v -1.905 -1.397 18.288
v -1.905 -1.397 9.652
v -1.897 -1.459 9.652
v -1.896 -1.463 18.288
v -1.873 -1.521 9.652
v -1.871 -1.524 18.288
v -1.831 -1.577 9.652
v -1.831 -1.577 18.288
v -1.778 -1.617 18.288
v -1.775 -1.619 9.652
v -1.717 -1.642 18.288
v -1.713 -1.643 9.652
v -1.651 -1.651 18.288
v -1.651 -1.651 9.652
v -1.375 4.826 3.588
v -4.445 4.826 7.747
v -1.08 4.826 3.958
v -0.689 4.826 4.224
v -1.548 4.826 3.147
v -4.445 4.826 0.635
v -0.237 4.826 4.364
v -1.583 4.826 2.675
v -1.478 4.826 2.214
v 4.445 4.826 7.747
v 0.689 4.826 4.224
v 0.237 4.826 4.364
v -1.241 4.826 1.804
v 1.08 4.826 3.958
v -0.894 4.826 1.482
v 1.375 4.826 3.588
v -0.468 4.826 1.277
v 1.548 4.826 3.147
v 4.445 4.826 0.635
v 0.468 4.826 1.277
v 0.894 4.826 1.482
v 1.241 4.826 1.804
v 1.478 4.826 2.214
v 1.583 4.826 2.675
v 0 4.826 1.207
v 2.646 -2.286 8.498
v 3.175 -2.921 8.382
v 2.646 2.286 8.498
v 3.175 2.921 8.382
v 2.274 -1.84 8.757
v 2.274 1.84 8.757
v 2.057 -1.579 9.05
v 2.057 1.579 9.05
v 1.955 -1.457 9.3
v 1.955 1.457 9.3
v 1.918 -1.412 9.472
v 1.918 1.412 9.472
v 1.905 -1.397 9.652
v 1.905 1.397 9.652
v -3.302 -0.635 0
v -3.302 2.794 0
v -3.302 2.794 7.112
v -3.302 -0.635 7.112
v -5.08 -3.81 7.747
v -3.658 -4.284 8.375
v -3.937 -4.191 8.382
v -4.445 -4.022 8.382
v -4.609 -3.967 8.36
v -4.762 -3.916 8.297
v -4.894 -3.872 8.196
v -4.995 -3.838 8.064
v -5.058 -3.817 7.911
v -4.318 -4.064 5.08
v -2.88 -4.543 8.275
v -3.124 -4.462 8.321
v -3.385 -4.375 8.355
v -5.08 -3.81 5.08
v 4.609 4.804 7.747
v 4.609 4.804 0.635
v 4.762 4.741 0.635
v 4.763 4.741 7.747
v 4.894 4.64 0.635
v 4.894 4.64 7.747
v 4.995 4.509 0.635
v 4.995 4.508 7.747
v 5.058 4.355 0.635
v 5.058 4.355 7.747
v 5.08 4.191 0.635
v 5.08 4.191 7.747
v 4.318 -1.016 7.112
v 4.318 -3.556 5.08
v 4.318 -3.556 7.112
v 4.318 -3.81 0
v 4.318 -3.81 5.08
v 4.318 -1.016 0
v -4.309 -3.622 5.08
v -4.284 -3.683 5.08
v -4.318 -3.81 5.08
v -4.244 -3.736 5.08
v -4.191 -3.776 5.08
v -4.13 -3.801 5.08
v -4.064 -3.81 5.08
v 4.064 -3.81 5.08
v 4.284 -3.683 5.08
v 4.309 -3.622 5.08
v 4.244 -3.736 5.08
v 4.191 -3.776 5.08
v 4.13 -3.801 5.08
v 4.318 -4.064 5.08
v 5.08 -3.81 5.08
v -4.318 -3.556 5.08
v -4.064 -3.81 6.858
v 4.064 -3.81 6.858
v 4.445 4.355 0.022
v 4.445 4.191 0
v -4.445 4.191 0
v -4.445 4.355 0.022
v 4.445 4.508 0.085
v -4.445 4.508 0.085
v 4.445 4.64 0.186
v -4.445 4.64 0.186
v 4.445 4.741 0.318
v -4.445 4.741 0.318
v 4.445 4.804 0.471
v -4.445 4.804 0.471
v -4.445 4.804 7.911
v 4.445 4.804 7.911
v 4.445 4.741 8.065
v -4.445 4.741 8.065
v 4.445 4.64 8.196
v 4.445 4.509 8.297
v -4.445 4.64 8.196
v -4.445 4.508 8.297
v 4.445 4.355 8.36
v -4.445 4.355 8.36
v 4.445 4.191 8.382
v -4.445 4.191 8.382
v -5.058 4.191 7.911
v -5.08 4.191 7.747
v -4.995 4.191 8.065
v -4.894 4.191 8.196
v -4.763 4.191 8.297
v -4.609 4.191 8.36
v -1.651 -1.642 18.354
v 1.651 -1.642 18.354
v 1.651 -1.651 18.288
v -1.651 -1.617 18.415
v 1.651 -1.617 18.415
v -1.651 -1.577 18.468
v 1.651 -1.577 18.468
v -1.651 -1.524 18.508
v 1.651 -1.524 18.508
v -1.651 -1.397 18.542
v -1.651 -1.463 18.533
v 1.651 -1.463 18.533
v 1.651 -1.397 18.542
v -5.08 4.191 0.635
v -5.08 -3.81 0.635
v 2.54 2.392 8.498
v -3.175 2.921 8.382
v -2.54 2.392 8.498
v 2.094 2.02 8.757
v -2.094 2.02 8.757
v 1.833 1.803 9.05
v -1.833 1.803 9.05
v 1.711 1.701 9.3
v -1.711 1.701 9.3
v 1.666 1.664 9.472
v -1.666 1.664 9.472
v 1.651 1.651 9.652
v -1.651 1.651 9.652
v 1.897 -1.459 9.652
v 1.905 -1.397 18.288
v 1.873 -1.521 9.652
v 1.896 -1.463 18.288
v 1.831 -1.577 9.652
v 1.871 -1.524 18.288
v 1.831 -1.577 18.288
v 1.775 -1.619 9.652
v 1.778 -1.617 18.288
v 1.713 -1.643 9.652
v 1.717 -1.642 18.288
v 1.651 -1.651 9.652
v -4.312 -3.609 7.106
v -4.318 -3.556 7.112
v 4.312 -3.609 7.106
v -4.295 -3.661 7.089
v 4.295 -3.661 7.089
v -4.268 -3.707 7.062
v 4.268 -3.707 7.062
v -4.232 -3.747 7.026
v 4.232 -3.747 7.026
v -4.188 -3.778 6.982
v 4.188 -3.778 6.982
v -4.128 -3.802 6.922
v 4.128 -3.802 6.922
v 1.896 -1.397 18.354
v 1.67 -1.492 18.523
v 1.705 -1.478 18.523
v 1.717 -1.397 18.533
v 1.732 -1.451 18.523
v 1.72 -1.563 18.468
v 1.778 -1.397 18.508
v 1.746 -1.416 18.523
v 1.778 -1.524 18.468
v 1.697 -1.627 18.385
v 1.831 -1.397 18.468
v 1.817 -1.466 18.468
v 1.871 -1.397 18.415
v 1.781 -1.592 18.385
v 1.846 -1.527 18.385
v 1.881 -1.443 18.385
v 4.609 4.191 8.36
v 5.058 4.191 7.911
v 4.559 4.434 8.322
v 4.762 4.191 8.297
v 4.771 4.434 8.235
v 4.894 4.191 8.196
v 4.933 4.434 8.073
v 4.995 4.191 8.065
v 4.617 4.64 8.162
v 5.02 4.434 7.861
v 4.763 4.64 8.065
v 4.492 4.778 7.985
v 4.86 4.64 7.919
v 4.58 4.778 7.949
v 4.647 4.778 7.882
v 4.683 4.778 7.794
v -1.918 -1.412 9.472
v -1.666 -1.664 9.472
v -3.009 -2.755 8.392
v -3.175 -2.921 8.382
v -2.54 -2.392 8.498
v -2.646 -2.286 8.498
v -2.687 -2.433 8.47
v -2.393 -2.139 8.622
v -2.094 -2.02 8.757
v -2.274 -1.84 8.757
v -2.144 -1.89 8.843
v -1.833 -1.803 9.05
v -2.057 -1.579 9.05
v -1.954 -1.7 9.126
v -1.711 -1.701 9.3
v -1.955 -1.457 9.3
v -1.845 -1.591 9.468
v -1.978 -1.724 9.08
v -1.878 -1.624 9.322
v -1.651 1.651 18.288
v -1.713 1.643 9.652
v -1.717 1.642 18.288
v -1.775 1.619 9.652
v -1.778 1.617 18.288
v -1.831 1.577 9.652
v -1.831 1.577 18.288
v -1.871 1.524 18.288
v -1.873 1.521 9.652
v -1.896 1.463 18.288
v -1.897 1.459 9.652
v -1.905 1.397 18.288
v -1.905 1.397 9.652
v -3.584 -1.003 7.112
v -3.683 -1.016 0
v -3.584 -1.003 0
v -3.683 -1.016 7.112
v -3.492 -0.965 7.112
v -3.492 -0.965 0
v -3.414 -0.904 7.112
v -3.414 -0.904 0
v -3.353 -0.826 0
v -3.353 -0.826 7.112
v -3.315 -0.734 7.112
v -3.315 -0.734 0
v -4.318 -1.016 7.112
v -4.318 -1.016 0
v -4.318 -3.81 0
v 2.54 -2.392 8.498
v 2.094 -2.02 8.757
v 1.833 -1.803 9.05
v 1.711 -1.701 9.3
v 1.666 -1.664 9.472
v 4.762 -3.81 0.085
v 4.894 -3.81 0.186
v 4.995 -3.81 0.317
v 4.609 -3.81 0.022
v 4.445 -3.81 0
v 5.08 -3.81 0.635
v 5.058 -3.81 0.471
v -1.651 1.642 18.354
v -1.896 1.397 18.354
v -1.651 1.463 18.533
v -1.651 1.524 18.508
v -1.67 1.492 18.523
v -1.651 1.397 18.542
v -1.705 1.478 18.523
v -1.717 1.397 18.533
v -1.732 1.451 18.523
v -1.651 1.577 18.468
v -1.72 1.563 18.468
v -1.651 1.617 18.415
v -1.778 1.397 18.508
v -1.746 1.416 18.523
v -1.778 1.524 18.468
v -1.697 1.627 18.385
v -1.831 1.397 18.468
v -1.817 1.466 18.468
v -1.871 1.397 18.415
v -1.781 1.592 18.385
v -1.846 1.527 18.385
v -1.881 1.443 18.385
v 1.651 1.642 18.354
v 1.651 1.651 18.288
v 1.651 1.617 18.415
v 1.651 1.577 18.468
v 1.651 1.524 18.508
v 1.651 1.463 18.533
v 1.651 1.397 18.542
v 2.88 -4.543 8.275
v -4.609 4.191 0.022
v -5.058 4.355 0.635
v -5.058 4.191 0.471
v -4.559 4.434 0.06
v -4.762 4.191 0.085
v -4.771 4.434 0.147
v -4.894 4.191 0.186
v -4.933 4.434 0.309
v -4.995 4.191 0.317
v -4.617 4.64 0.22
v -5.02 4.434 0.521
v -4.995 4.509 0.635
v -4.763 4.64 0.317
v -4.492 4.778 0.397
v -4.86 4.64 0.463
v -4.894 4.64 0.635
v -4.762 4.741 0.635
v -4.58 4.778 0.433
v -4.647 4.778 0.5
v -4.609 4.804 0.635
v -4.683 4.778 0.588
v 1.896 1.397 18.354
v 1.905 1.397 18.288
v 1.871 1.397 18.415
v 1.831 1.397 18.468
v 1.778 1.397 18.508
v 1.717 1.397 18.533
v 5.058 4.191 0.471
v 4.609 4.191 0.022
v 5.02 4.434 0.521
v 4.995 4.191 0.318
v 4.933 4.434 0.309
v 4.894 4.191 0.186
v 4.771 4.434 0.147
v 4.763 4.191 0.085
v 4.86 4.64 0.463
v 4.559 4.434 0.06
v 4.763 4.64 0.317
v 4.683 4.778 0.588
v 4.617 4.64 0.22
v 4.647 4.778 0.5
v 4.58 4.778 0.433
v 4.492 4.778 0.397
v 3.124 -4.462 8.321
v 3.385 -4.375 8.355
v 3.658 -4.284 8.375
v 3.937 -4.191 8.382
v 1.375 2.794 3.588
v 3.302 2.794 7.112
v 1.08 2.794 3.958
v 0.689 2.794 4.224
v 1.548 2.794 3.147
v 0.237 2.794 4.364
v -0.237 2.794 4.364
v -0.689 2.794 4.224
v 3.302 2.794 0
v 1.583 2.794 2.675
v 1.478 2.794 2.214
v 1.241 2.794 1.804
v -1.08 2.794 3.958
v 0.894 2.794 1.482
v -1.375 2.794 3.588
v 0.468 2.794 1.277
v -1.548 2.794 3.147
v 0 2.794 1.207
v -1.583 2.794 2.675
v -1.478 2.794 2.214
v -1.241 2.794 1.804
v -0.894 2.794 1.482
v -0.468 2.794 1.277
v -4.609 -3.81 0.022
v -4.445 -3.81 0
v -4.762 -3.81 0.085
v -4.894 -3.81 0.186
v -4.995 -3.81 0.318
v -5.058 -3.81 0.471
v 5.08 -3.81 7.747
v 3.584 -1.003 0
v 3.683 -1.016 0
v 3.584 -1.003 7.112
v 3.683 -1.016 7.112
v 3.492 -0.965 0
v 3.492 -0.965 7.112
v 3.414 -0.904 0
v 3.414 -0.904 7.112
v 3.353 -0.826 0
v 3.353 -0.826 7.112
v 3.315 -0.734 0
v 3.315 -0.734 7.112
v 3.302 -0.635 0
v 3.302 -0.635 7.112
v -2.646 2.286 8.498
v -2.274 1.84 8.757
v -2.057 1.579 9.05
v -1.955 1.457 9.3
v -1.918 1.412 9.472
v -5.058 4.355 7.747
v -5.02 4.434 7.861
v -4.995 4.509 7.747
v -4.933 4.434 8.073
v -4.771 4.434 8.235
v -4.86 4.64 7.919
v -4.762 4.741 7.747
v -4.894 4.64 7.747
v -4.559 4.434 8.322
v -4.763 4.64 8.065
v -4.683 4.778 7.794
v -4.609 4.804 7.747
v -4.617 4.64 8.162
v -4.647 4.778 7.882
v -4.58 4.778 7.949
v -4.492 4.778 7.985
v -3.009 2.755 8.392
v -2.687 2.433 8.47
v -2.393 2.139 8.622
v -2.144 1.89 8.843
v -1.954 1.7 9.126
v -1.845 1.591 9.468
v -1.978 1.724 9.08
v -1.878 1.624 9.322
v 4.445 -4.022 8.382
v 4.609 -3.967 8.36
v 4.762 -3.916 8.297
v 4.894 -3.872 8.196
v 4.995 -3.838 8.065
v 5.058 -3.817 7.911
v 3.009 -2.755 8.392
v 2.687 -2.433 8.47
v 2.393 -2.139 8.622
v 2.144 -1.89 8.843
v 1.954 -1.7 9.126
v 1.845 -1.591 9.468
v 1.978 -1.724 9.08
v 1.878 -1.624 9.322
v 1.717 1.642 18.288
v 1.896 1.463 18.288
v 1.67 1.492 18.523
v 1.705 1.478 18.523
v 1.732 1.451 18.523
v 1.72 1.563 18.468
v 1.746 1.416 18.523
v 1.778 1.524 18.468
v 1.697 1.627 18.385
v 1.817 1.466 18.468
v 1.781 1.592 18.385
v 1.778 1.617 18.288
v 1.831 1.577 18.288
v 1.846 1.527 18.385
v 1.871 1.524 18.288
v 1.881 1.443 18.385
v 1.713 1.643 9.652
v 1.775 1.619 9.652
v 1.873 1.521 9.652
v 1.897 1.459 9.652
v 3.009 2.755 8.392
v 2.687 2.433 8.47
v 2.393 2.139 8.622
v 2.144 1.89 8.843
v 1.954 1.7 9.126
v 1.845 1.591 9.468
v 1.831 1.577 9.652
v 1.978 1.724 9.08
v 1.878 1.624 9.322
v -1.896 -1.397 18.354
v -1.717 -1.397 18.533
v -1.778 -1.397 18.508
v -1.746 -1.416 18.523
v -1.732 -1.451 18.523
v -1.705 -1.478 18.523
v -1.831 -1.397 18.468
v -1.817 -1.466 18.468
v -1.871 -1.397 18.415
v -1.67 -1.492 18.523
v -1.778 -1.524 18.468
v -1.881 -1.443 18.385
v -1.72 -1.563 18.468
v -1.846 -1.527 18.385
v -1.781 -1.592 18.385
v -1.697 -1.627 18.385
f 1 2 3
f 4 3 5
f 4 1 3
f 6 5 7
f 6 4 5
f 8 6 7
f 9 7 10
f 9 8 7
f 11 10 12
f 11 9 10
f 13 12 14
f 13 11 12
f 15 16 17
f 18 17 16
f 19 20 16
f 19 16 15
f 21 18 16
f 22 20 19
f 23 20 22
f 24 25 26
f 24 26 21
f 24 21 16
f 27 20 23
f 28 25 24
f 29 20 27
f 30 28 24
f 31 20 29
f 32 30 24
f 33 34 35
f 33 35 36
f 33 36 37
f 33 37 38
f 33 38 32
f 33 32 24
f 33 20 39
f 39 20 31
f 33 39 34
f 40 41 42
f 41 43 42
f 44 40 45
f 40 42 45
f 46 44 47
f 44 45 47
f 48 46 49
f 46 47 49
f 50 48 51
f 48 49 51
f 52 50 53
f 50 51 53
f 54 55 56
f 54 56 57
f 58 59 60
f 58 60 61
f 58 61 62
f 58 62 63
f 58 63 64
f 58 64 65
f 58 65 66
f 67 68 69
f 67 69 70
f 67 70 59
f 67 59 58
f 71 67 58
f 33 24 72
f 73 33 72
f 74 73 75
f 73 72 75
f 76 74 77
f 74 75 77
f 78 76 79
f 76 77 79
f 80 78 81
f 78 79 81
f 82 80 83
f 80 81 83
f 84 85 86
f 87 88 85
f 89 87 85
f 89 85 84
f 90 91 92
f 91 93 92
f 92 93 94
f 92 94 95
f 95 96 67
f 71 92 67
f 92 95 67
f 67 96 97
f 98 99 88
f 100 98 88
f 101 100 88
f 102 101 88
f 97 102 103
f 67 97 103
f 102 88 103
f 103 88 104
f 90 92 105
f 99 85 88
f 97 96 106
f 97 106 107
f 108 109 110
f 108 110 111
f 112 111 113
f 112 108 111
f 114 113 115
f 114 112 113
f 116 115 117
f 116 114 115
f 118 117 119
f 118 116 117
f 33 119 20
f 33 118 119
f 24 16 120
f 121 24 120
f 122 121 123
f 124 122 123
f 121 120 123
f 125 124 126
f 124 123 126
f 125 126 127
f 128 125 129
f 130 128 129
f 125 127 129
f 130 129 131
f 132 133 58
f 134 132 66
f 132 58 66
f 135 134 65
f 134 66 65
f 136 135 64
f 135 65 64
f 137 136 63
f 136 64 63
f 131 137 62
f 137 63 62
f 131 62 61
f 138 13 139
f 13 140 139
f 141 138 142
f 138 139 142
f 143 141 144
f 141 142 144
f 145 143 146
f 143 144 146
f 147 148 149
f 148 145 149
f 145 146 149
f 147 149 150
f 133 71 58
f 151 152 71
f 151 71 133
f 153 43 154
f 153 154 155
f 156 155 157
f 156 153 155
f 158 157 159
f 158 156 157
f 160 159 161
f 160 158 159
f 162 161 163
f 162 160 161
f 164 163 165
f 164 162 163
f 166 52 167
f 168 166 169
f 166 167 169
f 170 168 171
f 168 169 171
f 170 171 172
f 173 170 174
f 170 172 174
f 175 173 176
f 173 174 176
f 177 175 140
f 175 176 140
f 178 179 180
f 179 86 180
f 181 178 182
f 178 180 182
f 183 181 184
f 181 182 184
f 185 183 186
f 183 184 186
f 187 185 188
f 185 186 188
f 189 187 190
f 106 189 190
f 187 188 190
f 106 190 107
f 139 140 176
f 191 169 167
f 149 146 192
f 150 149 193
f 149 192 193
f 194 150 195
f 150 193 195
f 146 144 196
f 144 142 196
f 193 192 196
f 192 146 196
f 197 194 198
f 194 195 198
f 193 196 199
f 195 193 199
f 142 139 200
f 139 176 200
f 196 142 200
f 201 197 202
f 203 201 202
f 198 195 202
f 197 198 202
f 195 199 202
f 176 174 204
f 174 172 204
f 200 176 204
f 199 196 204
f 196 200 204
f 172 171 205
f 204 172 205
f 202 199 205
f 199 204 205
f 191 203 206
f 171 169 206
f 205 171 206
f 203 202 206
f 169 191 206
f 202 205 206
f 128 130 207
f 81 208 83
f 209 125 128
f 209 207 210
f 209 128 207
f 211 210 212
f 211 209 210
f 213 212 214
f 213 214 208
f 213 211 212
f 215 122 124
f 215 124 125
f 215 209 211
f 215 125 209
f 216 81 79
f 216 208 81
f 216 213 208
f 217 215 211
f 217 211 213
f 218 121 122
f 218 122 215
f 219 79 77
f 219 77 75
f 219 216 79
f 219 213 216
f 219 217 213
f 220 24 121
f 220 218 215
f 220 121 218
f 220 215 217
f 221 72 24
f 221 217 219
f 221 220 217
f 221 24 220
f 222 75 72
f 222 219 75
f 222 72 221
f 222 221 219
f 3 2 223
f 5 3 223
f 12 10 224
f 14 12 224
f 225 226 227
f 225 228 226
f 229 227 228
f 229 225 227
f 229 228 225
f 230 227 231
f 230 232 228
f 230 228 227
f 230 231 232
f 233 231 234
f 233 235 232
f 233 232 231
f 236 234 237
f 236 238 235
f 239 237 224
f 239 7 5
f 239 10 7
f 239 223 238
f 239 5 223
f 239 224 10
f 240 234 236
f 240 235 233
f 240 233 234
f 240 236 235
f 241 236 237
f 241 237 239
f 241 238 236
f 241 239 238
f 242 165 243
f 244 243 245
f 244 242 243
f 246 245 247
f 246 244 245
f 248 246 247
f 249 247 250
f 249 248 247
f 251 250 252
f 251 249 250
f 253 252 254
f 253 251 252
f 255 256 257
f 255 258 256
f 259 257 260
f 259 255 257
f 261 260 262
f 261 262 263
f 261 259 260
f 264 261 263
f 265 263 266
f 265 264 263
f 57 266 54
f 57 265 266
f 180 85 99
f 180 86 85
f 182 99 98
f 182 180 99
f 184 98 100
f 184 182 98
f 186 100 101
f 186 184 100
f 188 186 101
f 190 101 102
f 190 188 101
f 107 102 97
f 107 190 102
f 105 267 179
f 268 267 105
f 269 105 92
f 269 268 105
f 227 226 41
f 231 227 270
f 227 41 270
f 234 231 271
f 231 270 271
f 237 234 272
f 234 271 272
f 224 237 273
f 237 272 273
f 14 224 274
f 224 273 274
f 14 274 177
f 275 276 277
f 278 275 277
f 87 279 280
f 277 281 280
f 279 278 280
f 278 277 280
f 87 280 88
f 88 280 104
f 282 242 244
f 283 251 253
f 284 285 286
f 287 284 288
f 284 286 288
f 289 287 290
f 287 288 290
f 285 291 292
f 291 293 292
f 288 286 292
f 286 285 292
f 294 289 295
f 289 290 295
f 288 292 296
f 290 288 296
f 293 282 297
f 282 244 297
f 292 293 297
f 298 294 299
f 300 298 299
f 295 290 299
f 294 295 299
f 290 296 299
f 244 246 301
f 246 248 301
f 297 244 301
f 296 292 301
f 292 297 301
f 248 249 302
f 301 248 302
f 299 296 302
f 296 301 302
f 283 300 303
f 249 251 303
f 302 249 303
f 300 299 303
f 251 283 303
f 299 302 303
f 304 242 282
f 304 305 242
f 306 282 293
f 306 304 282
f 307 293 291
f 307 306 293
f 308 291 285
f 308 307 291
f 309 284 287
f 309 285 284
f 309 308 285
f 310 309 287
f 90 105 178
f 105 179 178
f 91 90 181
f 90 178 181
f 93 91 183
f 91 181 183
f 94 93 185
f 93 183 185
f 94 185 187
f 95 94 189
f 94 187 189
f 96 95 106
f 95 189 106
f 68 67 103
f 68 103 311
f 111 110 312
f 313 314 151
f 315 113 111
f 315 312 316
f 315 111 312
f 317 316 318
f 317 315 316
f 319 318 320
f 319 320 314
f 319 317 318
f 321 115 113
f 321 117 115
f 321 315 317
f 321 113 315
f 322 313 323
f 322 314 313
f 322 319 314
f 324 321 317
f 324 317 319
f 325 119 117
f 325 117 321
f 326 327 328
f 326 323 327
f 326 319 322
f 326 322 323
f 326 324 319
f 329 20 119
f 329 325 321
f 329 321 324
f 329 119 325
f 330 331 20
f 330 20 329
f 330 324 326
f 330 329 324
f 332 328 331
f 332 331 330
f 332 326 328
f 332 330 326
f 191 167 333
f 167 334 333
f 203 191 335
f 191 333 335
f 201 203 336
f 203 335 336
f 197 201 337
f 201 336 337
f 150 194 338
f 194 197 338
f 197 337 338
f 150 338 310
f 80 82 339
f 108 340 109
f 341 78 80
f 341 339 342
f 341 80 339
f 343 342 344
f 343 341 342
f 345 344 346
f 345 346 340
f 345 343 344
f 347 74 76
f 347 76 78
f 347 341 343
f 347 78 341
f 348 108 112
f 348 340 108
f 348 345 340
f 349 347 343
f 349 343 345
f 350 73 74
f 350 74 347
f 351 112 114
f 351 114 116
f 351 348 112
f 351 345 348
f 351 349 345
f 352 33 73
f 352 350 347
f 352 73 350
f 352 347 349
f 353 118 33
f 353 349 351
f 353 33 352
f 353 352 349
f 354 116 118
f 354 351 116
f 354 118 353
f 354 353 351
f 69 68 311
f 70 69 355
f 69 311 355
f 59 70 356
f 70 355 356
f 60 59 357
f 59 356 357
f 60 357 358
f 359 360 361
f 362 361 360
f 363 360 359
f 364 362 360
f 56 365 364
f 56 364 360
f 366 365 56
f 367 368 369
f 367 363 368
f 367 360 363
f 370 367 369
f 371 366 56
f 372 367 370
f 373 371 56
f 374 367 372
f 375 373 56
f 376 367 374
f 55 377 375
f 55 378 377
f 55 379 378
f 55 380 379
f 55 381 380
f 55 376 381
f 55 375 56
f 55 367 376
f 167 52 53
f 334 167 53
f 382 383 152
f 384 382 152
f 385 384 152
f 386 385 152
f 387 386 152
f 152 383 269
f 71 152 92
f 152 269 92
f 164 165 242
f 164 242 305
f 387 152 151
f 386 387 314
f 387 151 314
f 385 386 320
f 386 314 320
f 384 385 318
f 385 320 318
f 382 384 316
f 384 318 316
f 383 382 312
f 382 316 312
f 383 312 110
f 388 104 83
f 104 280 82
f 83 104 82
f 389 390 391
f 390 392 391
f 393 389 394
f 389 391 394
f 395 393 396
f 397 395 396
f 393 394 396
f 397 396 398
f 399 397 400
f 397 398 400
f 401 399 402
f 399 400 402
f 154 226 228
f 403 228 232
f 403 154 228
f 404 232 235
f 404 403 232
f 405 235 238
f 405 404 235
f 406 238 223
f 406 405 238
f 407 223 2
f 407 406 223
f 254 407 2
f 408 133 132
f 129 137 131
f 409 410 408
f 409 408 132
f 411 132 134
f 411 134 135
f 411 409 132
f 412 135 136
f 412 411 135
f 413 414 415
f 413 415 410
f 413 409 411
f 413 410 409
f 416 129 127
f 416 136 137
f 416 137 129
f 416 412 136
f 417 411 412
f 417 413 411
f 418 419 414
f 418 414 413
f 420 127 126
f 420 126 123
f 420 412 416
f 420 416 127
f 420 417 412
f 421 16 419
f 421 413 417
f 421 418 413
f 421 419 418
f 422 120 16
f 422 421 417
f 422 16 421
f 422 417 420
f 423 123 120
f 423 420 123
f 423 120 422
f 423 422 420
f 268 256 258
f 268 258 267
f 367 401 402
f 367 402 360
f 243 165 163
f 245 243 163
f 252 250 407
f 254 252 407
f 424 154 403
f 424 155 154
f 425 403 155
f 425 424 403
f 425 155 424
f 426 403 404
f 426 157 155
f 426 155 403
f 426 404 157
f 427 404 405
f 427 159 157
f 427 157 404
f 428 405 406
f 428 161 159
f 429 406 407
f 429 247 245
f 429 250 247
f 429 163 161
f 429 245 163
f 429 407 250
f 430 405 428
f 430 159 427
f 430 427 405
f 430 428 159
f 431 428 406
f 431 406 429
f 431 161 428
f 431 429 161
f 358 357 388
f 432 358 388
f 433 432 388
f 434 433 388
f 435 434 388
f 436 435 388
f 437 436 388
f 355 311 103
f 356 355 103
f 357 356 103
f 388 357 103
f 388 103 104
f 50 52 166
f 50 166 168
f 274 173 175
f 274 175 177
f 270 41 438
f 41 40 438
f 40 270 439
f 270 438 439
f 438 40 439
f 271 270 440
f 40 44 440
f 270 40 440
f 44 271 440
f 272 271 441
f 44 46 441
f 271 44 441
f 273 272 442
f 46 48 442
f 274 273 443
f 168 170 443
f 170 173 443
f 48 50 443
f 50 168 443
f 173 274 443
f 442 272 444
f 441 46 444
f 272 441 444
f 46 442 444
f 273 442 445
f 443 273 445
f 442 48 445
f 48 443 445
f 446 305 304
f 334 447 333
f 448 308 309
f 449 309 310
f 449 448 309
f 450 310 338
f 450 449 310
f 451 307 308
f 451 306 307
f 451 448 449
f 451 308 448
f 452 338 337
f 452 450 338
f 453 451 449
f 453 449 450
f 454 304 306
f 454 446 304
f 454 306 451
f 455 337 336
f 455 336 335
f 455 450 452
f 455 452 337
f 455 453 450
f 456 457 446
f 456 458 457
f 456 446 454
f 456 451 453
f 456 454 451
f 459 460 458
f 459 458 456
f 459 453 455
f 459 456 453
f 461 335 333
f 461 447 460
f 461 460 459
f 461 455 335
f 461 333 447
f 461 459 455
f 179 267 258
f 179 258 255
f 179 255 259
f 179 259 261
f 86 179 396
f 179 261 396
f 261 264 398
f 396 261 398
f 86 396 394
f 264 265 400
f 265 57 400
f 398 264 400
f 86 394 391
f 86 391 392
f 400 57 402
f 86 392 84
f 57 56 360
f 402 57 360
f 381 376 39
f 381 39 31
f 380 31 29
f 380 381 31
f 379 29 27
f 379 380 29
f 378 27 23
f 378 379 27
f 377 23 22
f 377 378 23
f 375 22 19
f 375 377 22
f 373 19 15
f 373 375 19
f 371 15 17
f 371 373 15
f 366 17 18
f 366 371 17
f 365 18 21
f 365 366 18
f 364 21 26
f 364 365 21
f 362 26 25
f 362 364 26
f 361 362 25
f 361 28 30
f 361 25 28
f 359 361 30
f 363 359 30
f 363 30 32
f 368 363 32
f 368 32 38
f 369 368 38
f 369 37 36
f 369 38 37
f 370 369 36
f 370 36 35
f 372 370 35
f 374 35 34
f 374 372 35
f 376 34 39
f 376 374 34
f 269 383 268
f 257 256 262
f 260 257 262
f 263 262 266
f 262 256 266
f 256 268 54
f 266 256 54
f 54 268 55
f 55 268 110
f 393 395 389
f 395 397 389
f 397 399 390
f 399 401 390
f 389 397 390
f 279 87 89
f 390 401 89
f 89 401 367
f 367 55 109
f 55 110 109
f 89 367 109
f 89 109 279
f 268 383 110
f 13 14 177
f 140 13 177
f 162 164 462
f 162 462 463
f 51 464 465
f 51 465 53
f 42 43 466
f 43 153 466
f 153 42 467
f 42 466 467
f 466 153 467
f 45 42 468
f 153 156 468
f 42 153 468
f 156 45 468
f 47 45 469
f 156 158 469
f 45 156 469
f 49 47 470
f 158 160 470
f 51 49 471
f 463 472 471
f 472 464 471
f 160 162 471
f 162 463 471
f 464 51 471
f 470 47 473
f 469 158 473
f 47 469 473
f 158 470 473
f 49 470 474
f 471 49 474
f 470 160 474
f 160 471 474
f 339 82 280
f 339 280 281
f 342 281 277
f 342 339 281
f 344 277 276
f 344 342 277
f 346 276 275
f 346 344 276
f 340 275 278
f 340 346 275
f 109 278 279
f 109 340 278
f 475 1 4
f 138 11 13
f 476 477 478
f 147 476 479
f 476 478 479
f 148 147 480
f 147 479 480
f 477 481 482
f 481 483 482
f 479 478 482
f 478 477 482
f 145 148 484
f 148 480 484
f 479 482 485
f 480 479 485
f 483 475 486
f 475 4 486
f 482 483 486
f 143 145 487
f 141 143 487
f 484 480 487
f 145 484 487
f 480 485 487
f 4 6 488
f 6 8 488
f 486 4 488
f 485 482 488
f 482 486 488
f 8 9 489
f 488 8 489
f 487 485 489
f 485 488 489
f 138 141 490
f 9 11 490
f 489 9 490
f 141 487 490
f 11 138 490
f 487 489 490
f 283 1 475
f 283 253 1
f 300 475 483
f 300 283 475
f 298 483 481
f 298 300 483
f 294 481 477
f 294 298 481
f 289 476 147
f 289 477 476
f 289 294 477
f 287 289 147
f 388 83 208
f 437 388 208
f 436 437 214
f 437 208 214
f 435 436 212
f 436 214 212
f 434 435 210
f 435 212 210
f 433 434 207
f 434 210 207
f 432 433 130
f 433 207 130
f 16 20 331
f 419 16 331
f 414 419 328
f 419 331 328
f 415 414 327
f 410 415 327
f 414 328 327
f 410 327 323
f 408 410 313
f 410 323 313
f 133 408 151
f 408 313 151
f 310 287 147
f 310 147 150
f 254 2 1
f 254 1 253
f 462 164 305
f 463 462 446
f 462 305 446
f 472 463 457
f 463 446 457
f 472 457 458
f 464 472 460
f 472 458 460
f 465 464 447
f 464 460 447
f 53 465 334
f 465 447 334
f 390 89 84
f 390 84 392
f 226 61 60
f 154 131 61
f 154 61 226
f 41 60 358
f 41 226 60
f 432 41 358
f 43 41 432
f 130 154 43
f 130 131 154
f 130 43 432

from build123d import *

# Parameters (mm, degrees)
SKETCH1_W               = 10.16
SKETCH1_H               = 9.652
BOSS_EXTRUDE1_DEPTH     = 7.112
CUT_EXTRUDE1_DEPTH      = 14.021061708
CUT_EXTRUDE1_DEPTH_BACK = 14.021061708
SKETCH2_R               = 1.5875
SKETCH7_W               = 10.16
SKETCH7_H               = 9.652
BOSS_EXTRUDE3_DEPTH     = 1.27
FILLET1_R               = 0.635
FILLET3_R               = 0.635
FILLET4_R               = 0.381
CUT_EXTRUDE3_DEPTH      = 14.485940976
CUT_EXTRUDE3_DEPTH_BACK = 14.485940976
FILLET9_R               = 0.254
CUT_EXTRUDE7_DEPTH      = 9.654656319
SKETCH14_W              = 3.81
SKETCH14_H              = 3.302
BOSS_EXTRUDE4_DEPTH     = 10.16
FILLET14_R              = 1.27
FILLET15_R              = 0.254


with BuildPart() as part:
    # Sketch1 → Boss-Extrude1 (new body)
    with BuildSketch(Plane.XY):
        Rectangle(SKETCH1_W, SKETCH1_H)
        Polygon((-4.318, -3.81), (4.318, -3.81), (4.318, -1.016), (3.302, -1.016), (3.302, 2.794), (-3.302, 2.794), (-3.302, -1.016), (-4.318, -1.016), align=None, mode=Mode.SUBTRACT)
    extrude(amount=BOSS_EXTRUDE1_DEPTH)

    # Sketch2 → Cut-Extrude1 (cut, two sides: drawn at the far end of the back side and taken through both)
    with BuildSketch(Plane(origin=(0, 4.826, 0), x_dir=(1, 0, 0), z_dir=(0, 1, 0)).offset(-CUT_EXTRUDE1_DEPTH_BACK)):
        with Locations(Location((0, -2.794, 0), (0, 0, 90))):
            Circle(SKETCH2_R)
    extrude(amount=CUT_EXTRUDE1_DEPTH + CUT_EXTRUDE1_DEPTH_BACK, mode=Mode.SUBTRACT)

    # Sketch7 → Boss-Extrude3 (add)
    with BuildSketch(Plane.XY.offset(7.112)):
        Rectangle(SKETCH7_W, SKETCH7_H)
    extrude(amount=BOSS_EXTRUDE3_DEPTH)

    # Fillet1
    fillet1_edges = [part.edges().sort_by_distance(p)[0] for p in [
        (-5.08, 0, 0),
        (0, 4.826, 0),
        (5.08, 0, 0),
    ]]
    fillet(fillet1_edges, radius=FILLET1_R)

    # Fillet3
    # the kernel refuses this fillet: 0.635 mm, written as the material it takes off along each edge
    with BuildSketch(Plane(origin=(4.445, 4.191, 0.635), x_dir=(1, 0, 0), z_dir=(0, 1, 0))) as fillet3_piece_1_section:
        Polygon((0, 0), (FILLET3_R, 0), (FILLET3_R, FILLET3_R), (0, FILLET3_R), align=None)
    fillet3_piece_1 = extrude(amount=FILLET3_R, mode=Mode.PRIVATE)
    fillet3_piece_1 = fillet3_piece_1 - Plane(origin=(4.445, 4.191, 0.635), x_dir=(-0.7071067811865475, 0, 0.7071067811865475), z_dir=(0, 1, 0)) * Sphere(FILLET3_R, mode=Mode.PRIVATE)
    add(fillet3_piece_1, mode=Mode.SUBTRACT)
    with BuildSketch(Plane(origin=(-4.445, 4.191, 0.635), x_dir=(-1, 0, 0), z_dir=(0, 1, 0))) as fillet3_piece_2_section:
        Polygon((0, 0), (FILLET3_R, 0), (FILLET3_R, -FILLET3_R), (0, -FILLET3_R), align=None)
    fillet3_piece_2 = extrude(amount=FILLET3_R, mode=Mode.PRIVATE)
    fillet3_piece_2 = fillet3_piece_2 - Plane(origin=(-4.445, 4.191, 0.635), x_dir=(0.7071067811865475, 0, 0.7071067811865475), z_dir=(0, 1, 0)) * Sphere(FILLET3_R, mode=Mode.PRIVATE)
    add(fillet3_piece_2, mode=Mode.SUBTRACT)
    with BuildSketch(Plane(origin=(-4.445, -4.191, 7.747), x_dir=(0, 0, 1), z_dir=(-1, 0, 0))) as fillet3_piece_3_section:
        Polygon((0, 0), (FILLET3_R, 0), (FILLET3_R, -FILLET3_R), (0, -FILLET3_R), align=None)
    fillet3_piece_3 = extrude(amount=FILLET3_R, mode=Mode.PRIVATE)
    fillet3_piece_3 = fillet3_piece_3 - Plane(origin=(-4.445, -4.191, 7.747), x_dir=(0, 0.7071067811865475, -0.7071067811865475), z_dir=(-1, 0, 0)) * Sphere(FILLET3_R, mode=Mode.PRIVATE)
    add(fillet3_piece_3, mode=Mode.SUBTRACT)
    with BuildSketch(Plane(origin=(-4.445, 4.191, 7.747), x_dir=(-1, 0, 0), z_dir=(0, 1, 0))) as fillet3_piece_4_section:
        Polygon((0, 0), (FILLET3_R, 0), (FILLET3_R, FILLET3_R), (0, FILLET3_R), align=None)
    fillet3_piece_4 = extrude(amount=FILLET3_R, mode=Mode.PRIVATE)
    fillet3_piece_4 = fillet3_piece_4 - Plane(origin=(-4.445, 4.191, 7.747), x_dir=(0.7071067811865475, 0, -0.7071067811865475), z_dir=(0, 1, 0)) * Sphere(FILLET3_R, mode=Mode.PRIVATE)
    add(fillet3_piece_4, mode=Mode.SUBTRACT)
    with BuildSketch(Plane(origin=(4.445, -4.191, 7.747), x_dir=(1, 0, 0), z_dir=(0, 0, 1))) as fillet3_piece_5_section:
        Polygon((0, 0), (FILLET3_R, 0), (FILLET3_R, -FILLET3_R), (0, -FILLET3_R), align=None)
    fillet3_piece_5 = extrude(amount=FILLET3_R, mode=Mode.PRIVATE)
    fillet3_piece_5 = fillet3_piece_5 - Plane(origin=(4.445, -4.191, 7.747), x_dir=(-0.7071067811865476, 0.7071067811865475, 0), z_dir=(0, 0, 1)) * Sphere(FILLET3_R, mode=Mode.PRIVATE)
    add(fillet3_piece_5, mode=Mode.SUBTRACT)
    with BuildSketch(Plane(origin=(4.445, 4.191, 7.747), x_dir=(0, 0, 1), z_dir=(0, 1, 0))) as fillet3_piece_6_section:
        Polygon((0, 0), (FILLET3_R, 0), (FILLET3_R, FILLET3_R), (0, FILLET3_R), align=None)
    fillet3_piece_6 = extrude(amount=FILLET3_R, mode=Mode.PRIVATE)
    fillet3_piece_6 = fillet3_piece_6 - Plane(origin=(4.445, 4.191, 7.747), x_dir=(-0.7071067811865475, 0, -0.7071067811865475), z_dir=(0, 1, 0)) * Sphere(FILLET3_R, mode=Mode.PRIVATE)
    add(fillet3_piece_6, mode=Mode.SUBTRACT)
    with BuildSketch(Plane(origin=(-5.08, -4.191, 8.382), x_dir=(0, 0, -1), z_dir=(0, 1, 0))) as fillet3_piece_7:
        with BuildLine():
            CenterArc((FILLET3_R, -FILLET3_R), FILLET3_R, 90, 90)
            Line((0, -FILLET3_R), (0, 0))
            Line((0, 0), (FILLET3_R, 0))
        make_face()
    extrude(amount=8.382, mode=Mode.SUBTRACT)
    with BuildSketch(Plane(origin=(4.445, -4.826, 8.382), x_dir=(0, 1, 0), z_dir=(-1, 0, 0)), Plane(origin=(4.445, -4.826, 0), x_dir=(0, 0, 1), z_dir=(-1, 0, 0))) as fillet3_piece_8:
        with BuildLine():
            CenterArc((FILLET3_R, FILLET3_R), FILLET3_R, 180, 90)
            Line((0, FILLET3_R), (0, 0))
            Line((0, 0), (FILLET3_R, 0))
        make_face()
    extrude(amount=8.89, mode=Mode.SUBTRACT)
    with BuildSketch(Plane(origin=(5.08, 4.191, 8.382), x_dir=(-1, 0, 0), z_dir=(0, -1, 0))) as fillet3_piece_9:
        with BuildLine():
            CenterArc((FILLET3_R, FILLET3_R), FILLET3_R, 180, 90)
            Line((0, FILLET3_R), (0, 0))
            Line((0, 0), (FILLET3_R, 0))
        make_face()
    extrude(amount=8.382, mode=Mode.SUBTRACT)
    with BuildSketch(Plane(origin=(-4.445, 4.826, 8.382), x_dir=(0, 0, -1), z_dir=(1, 0, 0))) as fillet3_piece_10:
        with BuildLine():
            CenterArc((FILLET3_R, -FILLET3_R), FILLET3_R, 90, 90)
            Line((0, -FILLET3_R), (0, 0))
            Line((0, 0), (FILLET3_R, 0))
        make_face()
    extrude(amount=8.89, mode=Mode.SUBTRACT)
    with BuildSketch(Plane(origin=(4.445, -4.826, 0.635), x_dir=(0, 0, -1), z_dir=(-1, 0, 0))) as fillet3_piece_11:
        with BuildLine():
            CenterArc((0.635 - FILLET3_R, -FILLET3_R), FILLET3_R, 0, 90)
            Line((0.635, -FILLET3_R), (0.635, 0))
            Line((0.635, 0), (0.635 - FILLET3_R, 0))
        make_face()
    revolve(axis=Axis((4.445, -4.826, 0.635), (0, -1, 0)), revolution_arc=90, mode=Mode.SUBTRACT)
    with BuildSketch(Plane(origin=(-4.445, -4.826, 0.635), x_dir=(0, 0, -1), z_dir=(1, 0, 0))) as fillet3_piece_12:
        with BuildLine():
            CenterArc((0.635 - FILLET3_R, FILLET3_R), FILLET3_R, 270, 90)
            Line((0.635, FILLET3_R), (0.635, 0))
            Line((0.635, 0), (0.635 - FILLET3_R, 0))
        make_face()
    revolve(axis=Axis((-4.445, -4.826, 0.635), (0, 1, 0)), revolution_arc=90, mode=Mode.SUBTRACT)
    with BuildSketch(Plane(origin=(5.08, -4.826, 7.747), x_dir=(0, 1, 0), z_dir=(0, 0, -1)), Plane(origin=(-5.08, -4.826, 0.635), x_dir=(0, 1, 0), z_dir=(0, 0, 1)), Plane(origin=(-5.08, 4.826, 0.635), x_dir=(1, 0, 0), z_dir=(0, 0, 1)), Plane(origin=(5.08, 4.826, 7.747), x_dir=(-1, 0, 0), z_dir=(0, 0, -1))) as fillet3_piece_13:
        with BuildLine():
            CenterArc((FILLET3_R, -FILLET3_R), FILLET3_R, 90, 90)
            Line((0, -FILLET3_R), (0, 0))
            Line((0, 0), (FILLET3_R, 0))
        make_face()
    extrude(amount=7.112, mode=Mode.SUBTRACT)

    # Fillet4
    fillet4_edges = [part.edges().sort_by_distance(p)[0] for p in [
        (3.302, -1.016, 3.556),
        (-3.302, -1.016, 3.556),
    ]]
    fillet(fillet4_edges, radius=FILLET4_R)

    # Sketch11 → Cut-Extrude3 (cut, two sides: drawn at the far end of the back side and taken through both)
    with BuildSketch(Plane.ZY.offset(-4.318).offset(-CUT_EXTRUDE3_DEPTH_BACK)):
        Polygon((0, -3.81), (5.08, -3.81), (5.08, -4.064), (10.16, -4.826), (0, -4.826), align=None)
    extrude(amount=CUT_EXTRUDE3_DEPTH + CUT_EXTRUDE3_DEPTH_BACK, mode=Mode.SUBTRACT)

    # Fillet9
    fillet9_edges = [part.edges().sort_by_distance(p)[0] for p in [
        (-4.318, -3.81, 6.096),
        (4.318, -3.81, 6.096),
        (0, -3.81, 7.112),
    ]]
    fillet(fillet9_edges, radius=FILLET9_R)

    # Sketch13 → Cut-Extrude7 (cut, through all)
    with BuildSketch(Plane(origin=(0, 0, 5.08), x_dir=(-1, 0, 0), z_dir=(0, 0, -1))):
        Polygon((-5.08, -3.81), (-5.08, -4.826), (-2.032, -4.826), align=None)
        Polygon((5.08, -3.81), (5.08, -4.826), (2.032, -4.826), align=None)
    extrude(amount=-CUT_EXTRUDE7_DEPTH, mode=Mode.SUBTRACT)

    # Sketch14 → Boss-Extrude4 (add)
    with BuildSketch(Plane.XY.offset(8.382)):
        Rectangle(SKETCH14_W, SKETCH14_H)
    extrude(amount=BOSS_EXTRUDE4_DEPTH)

    # Fillet14
    fillet14_edges = [part.edges().sort_by_distance(p)[0] for p in [
        (0, 1.651, 8.382),
        (-1.905, 0, 8.382),
        (0, -1.651, 8.382),
        (1.905, 0, 8.382),
    ]]
    fillet(fillet14_edges, radius=FILLET14_R)

    # Fillet15
    fillet15_edges = [part.edges().sort_by_distance(p)[0] for p in [
        (1.905, 1.651, 14.097),
        (-1.905, 1.651, 14.097),
        (-1.905, -1.651, 14.097),
        (1.905, -1.651, 14.097),
        (0, 1.651, 18.542),
        (-1.905, 0, 18.542),
        (0, -1.651, 18.542),
        (1.905, 0, 18.542),
        (2.354517888, 2.100517888, 8.682614059),
        (2.354517888, -2.100517888, 8.682614059),
        (-2.354517888, 2.100517888, 8.682614059),
        (-2.354517888, -2.100517888, 8.682614059),
    ]]
    fillet(fillet15_edges, radius=FILLET15_R)


solid = part.part
